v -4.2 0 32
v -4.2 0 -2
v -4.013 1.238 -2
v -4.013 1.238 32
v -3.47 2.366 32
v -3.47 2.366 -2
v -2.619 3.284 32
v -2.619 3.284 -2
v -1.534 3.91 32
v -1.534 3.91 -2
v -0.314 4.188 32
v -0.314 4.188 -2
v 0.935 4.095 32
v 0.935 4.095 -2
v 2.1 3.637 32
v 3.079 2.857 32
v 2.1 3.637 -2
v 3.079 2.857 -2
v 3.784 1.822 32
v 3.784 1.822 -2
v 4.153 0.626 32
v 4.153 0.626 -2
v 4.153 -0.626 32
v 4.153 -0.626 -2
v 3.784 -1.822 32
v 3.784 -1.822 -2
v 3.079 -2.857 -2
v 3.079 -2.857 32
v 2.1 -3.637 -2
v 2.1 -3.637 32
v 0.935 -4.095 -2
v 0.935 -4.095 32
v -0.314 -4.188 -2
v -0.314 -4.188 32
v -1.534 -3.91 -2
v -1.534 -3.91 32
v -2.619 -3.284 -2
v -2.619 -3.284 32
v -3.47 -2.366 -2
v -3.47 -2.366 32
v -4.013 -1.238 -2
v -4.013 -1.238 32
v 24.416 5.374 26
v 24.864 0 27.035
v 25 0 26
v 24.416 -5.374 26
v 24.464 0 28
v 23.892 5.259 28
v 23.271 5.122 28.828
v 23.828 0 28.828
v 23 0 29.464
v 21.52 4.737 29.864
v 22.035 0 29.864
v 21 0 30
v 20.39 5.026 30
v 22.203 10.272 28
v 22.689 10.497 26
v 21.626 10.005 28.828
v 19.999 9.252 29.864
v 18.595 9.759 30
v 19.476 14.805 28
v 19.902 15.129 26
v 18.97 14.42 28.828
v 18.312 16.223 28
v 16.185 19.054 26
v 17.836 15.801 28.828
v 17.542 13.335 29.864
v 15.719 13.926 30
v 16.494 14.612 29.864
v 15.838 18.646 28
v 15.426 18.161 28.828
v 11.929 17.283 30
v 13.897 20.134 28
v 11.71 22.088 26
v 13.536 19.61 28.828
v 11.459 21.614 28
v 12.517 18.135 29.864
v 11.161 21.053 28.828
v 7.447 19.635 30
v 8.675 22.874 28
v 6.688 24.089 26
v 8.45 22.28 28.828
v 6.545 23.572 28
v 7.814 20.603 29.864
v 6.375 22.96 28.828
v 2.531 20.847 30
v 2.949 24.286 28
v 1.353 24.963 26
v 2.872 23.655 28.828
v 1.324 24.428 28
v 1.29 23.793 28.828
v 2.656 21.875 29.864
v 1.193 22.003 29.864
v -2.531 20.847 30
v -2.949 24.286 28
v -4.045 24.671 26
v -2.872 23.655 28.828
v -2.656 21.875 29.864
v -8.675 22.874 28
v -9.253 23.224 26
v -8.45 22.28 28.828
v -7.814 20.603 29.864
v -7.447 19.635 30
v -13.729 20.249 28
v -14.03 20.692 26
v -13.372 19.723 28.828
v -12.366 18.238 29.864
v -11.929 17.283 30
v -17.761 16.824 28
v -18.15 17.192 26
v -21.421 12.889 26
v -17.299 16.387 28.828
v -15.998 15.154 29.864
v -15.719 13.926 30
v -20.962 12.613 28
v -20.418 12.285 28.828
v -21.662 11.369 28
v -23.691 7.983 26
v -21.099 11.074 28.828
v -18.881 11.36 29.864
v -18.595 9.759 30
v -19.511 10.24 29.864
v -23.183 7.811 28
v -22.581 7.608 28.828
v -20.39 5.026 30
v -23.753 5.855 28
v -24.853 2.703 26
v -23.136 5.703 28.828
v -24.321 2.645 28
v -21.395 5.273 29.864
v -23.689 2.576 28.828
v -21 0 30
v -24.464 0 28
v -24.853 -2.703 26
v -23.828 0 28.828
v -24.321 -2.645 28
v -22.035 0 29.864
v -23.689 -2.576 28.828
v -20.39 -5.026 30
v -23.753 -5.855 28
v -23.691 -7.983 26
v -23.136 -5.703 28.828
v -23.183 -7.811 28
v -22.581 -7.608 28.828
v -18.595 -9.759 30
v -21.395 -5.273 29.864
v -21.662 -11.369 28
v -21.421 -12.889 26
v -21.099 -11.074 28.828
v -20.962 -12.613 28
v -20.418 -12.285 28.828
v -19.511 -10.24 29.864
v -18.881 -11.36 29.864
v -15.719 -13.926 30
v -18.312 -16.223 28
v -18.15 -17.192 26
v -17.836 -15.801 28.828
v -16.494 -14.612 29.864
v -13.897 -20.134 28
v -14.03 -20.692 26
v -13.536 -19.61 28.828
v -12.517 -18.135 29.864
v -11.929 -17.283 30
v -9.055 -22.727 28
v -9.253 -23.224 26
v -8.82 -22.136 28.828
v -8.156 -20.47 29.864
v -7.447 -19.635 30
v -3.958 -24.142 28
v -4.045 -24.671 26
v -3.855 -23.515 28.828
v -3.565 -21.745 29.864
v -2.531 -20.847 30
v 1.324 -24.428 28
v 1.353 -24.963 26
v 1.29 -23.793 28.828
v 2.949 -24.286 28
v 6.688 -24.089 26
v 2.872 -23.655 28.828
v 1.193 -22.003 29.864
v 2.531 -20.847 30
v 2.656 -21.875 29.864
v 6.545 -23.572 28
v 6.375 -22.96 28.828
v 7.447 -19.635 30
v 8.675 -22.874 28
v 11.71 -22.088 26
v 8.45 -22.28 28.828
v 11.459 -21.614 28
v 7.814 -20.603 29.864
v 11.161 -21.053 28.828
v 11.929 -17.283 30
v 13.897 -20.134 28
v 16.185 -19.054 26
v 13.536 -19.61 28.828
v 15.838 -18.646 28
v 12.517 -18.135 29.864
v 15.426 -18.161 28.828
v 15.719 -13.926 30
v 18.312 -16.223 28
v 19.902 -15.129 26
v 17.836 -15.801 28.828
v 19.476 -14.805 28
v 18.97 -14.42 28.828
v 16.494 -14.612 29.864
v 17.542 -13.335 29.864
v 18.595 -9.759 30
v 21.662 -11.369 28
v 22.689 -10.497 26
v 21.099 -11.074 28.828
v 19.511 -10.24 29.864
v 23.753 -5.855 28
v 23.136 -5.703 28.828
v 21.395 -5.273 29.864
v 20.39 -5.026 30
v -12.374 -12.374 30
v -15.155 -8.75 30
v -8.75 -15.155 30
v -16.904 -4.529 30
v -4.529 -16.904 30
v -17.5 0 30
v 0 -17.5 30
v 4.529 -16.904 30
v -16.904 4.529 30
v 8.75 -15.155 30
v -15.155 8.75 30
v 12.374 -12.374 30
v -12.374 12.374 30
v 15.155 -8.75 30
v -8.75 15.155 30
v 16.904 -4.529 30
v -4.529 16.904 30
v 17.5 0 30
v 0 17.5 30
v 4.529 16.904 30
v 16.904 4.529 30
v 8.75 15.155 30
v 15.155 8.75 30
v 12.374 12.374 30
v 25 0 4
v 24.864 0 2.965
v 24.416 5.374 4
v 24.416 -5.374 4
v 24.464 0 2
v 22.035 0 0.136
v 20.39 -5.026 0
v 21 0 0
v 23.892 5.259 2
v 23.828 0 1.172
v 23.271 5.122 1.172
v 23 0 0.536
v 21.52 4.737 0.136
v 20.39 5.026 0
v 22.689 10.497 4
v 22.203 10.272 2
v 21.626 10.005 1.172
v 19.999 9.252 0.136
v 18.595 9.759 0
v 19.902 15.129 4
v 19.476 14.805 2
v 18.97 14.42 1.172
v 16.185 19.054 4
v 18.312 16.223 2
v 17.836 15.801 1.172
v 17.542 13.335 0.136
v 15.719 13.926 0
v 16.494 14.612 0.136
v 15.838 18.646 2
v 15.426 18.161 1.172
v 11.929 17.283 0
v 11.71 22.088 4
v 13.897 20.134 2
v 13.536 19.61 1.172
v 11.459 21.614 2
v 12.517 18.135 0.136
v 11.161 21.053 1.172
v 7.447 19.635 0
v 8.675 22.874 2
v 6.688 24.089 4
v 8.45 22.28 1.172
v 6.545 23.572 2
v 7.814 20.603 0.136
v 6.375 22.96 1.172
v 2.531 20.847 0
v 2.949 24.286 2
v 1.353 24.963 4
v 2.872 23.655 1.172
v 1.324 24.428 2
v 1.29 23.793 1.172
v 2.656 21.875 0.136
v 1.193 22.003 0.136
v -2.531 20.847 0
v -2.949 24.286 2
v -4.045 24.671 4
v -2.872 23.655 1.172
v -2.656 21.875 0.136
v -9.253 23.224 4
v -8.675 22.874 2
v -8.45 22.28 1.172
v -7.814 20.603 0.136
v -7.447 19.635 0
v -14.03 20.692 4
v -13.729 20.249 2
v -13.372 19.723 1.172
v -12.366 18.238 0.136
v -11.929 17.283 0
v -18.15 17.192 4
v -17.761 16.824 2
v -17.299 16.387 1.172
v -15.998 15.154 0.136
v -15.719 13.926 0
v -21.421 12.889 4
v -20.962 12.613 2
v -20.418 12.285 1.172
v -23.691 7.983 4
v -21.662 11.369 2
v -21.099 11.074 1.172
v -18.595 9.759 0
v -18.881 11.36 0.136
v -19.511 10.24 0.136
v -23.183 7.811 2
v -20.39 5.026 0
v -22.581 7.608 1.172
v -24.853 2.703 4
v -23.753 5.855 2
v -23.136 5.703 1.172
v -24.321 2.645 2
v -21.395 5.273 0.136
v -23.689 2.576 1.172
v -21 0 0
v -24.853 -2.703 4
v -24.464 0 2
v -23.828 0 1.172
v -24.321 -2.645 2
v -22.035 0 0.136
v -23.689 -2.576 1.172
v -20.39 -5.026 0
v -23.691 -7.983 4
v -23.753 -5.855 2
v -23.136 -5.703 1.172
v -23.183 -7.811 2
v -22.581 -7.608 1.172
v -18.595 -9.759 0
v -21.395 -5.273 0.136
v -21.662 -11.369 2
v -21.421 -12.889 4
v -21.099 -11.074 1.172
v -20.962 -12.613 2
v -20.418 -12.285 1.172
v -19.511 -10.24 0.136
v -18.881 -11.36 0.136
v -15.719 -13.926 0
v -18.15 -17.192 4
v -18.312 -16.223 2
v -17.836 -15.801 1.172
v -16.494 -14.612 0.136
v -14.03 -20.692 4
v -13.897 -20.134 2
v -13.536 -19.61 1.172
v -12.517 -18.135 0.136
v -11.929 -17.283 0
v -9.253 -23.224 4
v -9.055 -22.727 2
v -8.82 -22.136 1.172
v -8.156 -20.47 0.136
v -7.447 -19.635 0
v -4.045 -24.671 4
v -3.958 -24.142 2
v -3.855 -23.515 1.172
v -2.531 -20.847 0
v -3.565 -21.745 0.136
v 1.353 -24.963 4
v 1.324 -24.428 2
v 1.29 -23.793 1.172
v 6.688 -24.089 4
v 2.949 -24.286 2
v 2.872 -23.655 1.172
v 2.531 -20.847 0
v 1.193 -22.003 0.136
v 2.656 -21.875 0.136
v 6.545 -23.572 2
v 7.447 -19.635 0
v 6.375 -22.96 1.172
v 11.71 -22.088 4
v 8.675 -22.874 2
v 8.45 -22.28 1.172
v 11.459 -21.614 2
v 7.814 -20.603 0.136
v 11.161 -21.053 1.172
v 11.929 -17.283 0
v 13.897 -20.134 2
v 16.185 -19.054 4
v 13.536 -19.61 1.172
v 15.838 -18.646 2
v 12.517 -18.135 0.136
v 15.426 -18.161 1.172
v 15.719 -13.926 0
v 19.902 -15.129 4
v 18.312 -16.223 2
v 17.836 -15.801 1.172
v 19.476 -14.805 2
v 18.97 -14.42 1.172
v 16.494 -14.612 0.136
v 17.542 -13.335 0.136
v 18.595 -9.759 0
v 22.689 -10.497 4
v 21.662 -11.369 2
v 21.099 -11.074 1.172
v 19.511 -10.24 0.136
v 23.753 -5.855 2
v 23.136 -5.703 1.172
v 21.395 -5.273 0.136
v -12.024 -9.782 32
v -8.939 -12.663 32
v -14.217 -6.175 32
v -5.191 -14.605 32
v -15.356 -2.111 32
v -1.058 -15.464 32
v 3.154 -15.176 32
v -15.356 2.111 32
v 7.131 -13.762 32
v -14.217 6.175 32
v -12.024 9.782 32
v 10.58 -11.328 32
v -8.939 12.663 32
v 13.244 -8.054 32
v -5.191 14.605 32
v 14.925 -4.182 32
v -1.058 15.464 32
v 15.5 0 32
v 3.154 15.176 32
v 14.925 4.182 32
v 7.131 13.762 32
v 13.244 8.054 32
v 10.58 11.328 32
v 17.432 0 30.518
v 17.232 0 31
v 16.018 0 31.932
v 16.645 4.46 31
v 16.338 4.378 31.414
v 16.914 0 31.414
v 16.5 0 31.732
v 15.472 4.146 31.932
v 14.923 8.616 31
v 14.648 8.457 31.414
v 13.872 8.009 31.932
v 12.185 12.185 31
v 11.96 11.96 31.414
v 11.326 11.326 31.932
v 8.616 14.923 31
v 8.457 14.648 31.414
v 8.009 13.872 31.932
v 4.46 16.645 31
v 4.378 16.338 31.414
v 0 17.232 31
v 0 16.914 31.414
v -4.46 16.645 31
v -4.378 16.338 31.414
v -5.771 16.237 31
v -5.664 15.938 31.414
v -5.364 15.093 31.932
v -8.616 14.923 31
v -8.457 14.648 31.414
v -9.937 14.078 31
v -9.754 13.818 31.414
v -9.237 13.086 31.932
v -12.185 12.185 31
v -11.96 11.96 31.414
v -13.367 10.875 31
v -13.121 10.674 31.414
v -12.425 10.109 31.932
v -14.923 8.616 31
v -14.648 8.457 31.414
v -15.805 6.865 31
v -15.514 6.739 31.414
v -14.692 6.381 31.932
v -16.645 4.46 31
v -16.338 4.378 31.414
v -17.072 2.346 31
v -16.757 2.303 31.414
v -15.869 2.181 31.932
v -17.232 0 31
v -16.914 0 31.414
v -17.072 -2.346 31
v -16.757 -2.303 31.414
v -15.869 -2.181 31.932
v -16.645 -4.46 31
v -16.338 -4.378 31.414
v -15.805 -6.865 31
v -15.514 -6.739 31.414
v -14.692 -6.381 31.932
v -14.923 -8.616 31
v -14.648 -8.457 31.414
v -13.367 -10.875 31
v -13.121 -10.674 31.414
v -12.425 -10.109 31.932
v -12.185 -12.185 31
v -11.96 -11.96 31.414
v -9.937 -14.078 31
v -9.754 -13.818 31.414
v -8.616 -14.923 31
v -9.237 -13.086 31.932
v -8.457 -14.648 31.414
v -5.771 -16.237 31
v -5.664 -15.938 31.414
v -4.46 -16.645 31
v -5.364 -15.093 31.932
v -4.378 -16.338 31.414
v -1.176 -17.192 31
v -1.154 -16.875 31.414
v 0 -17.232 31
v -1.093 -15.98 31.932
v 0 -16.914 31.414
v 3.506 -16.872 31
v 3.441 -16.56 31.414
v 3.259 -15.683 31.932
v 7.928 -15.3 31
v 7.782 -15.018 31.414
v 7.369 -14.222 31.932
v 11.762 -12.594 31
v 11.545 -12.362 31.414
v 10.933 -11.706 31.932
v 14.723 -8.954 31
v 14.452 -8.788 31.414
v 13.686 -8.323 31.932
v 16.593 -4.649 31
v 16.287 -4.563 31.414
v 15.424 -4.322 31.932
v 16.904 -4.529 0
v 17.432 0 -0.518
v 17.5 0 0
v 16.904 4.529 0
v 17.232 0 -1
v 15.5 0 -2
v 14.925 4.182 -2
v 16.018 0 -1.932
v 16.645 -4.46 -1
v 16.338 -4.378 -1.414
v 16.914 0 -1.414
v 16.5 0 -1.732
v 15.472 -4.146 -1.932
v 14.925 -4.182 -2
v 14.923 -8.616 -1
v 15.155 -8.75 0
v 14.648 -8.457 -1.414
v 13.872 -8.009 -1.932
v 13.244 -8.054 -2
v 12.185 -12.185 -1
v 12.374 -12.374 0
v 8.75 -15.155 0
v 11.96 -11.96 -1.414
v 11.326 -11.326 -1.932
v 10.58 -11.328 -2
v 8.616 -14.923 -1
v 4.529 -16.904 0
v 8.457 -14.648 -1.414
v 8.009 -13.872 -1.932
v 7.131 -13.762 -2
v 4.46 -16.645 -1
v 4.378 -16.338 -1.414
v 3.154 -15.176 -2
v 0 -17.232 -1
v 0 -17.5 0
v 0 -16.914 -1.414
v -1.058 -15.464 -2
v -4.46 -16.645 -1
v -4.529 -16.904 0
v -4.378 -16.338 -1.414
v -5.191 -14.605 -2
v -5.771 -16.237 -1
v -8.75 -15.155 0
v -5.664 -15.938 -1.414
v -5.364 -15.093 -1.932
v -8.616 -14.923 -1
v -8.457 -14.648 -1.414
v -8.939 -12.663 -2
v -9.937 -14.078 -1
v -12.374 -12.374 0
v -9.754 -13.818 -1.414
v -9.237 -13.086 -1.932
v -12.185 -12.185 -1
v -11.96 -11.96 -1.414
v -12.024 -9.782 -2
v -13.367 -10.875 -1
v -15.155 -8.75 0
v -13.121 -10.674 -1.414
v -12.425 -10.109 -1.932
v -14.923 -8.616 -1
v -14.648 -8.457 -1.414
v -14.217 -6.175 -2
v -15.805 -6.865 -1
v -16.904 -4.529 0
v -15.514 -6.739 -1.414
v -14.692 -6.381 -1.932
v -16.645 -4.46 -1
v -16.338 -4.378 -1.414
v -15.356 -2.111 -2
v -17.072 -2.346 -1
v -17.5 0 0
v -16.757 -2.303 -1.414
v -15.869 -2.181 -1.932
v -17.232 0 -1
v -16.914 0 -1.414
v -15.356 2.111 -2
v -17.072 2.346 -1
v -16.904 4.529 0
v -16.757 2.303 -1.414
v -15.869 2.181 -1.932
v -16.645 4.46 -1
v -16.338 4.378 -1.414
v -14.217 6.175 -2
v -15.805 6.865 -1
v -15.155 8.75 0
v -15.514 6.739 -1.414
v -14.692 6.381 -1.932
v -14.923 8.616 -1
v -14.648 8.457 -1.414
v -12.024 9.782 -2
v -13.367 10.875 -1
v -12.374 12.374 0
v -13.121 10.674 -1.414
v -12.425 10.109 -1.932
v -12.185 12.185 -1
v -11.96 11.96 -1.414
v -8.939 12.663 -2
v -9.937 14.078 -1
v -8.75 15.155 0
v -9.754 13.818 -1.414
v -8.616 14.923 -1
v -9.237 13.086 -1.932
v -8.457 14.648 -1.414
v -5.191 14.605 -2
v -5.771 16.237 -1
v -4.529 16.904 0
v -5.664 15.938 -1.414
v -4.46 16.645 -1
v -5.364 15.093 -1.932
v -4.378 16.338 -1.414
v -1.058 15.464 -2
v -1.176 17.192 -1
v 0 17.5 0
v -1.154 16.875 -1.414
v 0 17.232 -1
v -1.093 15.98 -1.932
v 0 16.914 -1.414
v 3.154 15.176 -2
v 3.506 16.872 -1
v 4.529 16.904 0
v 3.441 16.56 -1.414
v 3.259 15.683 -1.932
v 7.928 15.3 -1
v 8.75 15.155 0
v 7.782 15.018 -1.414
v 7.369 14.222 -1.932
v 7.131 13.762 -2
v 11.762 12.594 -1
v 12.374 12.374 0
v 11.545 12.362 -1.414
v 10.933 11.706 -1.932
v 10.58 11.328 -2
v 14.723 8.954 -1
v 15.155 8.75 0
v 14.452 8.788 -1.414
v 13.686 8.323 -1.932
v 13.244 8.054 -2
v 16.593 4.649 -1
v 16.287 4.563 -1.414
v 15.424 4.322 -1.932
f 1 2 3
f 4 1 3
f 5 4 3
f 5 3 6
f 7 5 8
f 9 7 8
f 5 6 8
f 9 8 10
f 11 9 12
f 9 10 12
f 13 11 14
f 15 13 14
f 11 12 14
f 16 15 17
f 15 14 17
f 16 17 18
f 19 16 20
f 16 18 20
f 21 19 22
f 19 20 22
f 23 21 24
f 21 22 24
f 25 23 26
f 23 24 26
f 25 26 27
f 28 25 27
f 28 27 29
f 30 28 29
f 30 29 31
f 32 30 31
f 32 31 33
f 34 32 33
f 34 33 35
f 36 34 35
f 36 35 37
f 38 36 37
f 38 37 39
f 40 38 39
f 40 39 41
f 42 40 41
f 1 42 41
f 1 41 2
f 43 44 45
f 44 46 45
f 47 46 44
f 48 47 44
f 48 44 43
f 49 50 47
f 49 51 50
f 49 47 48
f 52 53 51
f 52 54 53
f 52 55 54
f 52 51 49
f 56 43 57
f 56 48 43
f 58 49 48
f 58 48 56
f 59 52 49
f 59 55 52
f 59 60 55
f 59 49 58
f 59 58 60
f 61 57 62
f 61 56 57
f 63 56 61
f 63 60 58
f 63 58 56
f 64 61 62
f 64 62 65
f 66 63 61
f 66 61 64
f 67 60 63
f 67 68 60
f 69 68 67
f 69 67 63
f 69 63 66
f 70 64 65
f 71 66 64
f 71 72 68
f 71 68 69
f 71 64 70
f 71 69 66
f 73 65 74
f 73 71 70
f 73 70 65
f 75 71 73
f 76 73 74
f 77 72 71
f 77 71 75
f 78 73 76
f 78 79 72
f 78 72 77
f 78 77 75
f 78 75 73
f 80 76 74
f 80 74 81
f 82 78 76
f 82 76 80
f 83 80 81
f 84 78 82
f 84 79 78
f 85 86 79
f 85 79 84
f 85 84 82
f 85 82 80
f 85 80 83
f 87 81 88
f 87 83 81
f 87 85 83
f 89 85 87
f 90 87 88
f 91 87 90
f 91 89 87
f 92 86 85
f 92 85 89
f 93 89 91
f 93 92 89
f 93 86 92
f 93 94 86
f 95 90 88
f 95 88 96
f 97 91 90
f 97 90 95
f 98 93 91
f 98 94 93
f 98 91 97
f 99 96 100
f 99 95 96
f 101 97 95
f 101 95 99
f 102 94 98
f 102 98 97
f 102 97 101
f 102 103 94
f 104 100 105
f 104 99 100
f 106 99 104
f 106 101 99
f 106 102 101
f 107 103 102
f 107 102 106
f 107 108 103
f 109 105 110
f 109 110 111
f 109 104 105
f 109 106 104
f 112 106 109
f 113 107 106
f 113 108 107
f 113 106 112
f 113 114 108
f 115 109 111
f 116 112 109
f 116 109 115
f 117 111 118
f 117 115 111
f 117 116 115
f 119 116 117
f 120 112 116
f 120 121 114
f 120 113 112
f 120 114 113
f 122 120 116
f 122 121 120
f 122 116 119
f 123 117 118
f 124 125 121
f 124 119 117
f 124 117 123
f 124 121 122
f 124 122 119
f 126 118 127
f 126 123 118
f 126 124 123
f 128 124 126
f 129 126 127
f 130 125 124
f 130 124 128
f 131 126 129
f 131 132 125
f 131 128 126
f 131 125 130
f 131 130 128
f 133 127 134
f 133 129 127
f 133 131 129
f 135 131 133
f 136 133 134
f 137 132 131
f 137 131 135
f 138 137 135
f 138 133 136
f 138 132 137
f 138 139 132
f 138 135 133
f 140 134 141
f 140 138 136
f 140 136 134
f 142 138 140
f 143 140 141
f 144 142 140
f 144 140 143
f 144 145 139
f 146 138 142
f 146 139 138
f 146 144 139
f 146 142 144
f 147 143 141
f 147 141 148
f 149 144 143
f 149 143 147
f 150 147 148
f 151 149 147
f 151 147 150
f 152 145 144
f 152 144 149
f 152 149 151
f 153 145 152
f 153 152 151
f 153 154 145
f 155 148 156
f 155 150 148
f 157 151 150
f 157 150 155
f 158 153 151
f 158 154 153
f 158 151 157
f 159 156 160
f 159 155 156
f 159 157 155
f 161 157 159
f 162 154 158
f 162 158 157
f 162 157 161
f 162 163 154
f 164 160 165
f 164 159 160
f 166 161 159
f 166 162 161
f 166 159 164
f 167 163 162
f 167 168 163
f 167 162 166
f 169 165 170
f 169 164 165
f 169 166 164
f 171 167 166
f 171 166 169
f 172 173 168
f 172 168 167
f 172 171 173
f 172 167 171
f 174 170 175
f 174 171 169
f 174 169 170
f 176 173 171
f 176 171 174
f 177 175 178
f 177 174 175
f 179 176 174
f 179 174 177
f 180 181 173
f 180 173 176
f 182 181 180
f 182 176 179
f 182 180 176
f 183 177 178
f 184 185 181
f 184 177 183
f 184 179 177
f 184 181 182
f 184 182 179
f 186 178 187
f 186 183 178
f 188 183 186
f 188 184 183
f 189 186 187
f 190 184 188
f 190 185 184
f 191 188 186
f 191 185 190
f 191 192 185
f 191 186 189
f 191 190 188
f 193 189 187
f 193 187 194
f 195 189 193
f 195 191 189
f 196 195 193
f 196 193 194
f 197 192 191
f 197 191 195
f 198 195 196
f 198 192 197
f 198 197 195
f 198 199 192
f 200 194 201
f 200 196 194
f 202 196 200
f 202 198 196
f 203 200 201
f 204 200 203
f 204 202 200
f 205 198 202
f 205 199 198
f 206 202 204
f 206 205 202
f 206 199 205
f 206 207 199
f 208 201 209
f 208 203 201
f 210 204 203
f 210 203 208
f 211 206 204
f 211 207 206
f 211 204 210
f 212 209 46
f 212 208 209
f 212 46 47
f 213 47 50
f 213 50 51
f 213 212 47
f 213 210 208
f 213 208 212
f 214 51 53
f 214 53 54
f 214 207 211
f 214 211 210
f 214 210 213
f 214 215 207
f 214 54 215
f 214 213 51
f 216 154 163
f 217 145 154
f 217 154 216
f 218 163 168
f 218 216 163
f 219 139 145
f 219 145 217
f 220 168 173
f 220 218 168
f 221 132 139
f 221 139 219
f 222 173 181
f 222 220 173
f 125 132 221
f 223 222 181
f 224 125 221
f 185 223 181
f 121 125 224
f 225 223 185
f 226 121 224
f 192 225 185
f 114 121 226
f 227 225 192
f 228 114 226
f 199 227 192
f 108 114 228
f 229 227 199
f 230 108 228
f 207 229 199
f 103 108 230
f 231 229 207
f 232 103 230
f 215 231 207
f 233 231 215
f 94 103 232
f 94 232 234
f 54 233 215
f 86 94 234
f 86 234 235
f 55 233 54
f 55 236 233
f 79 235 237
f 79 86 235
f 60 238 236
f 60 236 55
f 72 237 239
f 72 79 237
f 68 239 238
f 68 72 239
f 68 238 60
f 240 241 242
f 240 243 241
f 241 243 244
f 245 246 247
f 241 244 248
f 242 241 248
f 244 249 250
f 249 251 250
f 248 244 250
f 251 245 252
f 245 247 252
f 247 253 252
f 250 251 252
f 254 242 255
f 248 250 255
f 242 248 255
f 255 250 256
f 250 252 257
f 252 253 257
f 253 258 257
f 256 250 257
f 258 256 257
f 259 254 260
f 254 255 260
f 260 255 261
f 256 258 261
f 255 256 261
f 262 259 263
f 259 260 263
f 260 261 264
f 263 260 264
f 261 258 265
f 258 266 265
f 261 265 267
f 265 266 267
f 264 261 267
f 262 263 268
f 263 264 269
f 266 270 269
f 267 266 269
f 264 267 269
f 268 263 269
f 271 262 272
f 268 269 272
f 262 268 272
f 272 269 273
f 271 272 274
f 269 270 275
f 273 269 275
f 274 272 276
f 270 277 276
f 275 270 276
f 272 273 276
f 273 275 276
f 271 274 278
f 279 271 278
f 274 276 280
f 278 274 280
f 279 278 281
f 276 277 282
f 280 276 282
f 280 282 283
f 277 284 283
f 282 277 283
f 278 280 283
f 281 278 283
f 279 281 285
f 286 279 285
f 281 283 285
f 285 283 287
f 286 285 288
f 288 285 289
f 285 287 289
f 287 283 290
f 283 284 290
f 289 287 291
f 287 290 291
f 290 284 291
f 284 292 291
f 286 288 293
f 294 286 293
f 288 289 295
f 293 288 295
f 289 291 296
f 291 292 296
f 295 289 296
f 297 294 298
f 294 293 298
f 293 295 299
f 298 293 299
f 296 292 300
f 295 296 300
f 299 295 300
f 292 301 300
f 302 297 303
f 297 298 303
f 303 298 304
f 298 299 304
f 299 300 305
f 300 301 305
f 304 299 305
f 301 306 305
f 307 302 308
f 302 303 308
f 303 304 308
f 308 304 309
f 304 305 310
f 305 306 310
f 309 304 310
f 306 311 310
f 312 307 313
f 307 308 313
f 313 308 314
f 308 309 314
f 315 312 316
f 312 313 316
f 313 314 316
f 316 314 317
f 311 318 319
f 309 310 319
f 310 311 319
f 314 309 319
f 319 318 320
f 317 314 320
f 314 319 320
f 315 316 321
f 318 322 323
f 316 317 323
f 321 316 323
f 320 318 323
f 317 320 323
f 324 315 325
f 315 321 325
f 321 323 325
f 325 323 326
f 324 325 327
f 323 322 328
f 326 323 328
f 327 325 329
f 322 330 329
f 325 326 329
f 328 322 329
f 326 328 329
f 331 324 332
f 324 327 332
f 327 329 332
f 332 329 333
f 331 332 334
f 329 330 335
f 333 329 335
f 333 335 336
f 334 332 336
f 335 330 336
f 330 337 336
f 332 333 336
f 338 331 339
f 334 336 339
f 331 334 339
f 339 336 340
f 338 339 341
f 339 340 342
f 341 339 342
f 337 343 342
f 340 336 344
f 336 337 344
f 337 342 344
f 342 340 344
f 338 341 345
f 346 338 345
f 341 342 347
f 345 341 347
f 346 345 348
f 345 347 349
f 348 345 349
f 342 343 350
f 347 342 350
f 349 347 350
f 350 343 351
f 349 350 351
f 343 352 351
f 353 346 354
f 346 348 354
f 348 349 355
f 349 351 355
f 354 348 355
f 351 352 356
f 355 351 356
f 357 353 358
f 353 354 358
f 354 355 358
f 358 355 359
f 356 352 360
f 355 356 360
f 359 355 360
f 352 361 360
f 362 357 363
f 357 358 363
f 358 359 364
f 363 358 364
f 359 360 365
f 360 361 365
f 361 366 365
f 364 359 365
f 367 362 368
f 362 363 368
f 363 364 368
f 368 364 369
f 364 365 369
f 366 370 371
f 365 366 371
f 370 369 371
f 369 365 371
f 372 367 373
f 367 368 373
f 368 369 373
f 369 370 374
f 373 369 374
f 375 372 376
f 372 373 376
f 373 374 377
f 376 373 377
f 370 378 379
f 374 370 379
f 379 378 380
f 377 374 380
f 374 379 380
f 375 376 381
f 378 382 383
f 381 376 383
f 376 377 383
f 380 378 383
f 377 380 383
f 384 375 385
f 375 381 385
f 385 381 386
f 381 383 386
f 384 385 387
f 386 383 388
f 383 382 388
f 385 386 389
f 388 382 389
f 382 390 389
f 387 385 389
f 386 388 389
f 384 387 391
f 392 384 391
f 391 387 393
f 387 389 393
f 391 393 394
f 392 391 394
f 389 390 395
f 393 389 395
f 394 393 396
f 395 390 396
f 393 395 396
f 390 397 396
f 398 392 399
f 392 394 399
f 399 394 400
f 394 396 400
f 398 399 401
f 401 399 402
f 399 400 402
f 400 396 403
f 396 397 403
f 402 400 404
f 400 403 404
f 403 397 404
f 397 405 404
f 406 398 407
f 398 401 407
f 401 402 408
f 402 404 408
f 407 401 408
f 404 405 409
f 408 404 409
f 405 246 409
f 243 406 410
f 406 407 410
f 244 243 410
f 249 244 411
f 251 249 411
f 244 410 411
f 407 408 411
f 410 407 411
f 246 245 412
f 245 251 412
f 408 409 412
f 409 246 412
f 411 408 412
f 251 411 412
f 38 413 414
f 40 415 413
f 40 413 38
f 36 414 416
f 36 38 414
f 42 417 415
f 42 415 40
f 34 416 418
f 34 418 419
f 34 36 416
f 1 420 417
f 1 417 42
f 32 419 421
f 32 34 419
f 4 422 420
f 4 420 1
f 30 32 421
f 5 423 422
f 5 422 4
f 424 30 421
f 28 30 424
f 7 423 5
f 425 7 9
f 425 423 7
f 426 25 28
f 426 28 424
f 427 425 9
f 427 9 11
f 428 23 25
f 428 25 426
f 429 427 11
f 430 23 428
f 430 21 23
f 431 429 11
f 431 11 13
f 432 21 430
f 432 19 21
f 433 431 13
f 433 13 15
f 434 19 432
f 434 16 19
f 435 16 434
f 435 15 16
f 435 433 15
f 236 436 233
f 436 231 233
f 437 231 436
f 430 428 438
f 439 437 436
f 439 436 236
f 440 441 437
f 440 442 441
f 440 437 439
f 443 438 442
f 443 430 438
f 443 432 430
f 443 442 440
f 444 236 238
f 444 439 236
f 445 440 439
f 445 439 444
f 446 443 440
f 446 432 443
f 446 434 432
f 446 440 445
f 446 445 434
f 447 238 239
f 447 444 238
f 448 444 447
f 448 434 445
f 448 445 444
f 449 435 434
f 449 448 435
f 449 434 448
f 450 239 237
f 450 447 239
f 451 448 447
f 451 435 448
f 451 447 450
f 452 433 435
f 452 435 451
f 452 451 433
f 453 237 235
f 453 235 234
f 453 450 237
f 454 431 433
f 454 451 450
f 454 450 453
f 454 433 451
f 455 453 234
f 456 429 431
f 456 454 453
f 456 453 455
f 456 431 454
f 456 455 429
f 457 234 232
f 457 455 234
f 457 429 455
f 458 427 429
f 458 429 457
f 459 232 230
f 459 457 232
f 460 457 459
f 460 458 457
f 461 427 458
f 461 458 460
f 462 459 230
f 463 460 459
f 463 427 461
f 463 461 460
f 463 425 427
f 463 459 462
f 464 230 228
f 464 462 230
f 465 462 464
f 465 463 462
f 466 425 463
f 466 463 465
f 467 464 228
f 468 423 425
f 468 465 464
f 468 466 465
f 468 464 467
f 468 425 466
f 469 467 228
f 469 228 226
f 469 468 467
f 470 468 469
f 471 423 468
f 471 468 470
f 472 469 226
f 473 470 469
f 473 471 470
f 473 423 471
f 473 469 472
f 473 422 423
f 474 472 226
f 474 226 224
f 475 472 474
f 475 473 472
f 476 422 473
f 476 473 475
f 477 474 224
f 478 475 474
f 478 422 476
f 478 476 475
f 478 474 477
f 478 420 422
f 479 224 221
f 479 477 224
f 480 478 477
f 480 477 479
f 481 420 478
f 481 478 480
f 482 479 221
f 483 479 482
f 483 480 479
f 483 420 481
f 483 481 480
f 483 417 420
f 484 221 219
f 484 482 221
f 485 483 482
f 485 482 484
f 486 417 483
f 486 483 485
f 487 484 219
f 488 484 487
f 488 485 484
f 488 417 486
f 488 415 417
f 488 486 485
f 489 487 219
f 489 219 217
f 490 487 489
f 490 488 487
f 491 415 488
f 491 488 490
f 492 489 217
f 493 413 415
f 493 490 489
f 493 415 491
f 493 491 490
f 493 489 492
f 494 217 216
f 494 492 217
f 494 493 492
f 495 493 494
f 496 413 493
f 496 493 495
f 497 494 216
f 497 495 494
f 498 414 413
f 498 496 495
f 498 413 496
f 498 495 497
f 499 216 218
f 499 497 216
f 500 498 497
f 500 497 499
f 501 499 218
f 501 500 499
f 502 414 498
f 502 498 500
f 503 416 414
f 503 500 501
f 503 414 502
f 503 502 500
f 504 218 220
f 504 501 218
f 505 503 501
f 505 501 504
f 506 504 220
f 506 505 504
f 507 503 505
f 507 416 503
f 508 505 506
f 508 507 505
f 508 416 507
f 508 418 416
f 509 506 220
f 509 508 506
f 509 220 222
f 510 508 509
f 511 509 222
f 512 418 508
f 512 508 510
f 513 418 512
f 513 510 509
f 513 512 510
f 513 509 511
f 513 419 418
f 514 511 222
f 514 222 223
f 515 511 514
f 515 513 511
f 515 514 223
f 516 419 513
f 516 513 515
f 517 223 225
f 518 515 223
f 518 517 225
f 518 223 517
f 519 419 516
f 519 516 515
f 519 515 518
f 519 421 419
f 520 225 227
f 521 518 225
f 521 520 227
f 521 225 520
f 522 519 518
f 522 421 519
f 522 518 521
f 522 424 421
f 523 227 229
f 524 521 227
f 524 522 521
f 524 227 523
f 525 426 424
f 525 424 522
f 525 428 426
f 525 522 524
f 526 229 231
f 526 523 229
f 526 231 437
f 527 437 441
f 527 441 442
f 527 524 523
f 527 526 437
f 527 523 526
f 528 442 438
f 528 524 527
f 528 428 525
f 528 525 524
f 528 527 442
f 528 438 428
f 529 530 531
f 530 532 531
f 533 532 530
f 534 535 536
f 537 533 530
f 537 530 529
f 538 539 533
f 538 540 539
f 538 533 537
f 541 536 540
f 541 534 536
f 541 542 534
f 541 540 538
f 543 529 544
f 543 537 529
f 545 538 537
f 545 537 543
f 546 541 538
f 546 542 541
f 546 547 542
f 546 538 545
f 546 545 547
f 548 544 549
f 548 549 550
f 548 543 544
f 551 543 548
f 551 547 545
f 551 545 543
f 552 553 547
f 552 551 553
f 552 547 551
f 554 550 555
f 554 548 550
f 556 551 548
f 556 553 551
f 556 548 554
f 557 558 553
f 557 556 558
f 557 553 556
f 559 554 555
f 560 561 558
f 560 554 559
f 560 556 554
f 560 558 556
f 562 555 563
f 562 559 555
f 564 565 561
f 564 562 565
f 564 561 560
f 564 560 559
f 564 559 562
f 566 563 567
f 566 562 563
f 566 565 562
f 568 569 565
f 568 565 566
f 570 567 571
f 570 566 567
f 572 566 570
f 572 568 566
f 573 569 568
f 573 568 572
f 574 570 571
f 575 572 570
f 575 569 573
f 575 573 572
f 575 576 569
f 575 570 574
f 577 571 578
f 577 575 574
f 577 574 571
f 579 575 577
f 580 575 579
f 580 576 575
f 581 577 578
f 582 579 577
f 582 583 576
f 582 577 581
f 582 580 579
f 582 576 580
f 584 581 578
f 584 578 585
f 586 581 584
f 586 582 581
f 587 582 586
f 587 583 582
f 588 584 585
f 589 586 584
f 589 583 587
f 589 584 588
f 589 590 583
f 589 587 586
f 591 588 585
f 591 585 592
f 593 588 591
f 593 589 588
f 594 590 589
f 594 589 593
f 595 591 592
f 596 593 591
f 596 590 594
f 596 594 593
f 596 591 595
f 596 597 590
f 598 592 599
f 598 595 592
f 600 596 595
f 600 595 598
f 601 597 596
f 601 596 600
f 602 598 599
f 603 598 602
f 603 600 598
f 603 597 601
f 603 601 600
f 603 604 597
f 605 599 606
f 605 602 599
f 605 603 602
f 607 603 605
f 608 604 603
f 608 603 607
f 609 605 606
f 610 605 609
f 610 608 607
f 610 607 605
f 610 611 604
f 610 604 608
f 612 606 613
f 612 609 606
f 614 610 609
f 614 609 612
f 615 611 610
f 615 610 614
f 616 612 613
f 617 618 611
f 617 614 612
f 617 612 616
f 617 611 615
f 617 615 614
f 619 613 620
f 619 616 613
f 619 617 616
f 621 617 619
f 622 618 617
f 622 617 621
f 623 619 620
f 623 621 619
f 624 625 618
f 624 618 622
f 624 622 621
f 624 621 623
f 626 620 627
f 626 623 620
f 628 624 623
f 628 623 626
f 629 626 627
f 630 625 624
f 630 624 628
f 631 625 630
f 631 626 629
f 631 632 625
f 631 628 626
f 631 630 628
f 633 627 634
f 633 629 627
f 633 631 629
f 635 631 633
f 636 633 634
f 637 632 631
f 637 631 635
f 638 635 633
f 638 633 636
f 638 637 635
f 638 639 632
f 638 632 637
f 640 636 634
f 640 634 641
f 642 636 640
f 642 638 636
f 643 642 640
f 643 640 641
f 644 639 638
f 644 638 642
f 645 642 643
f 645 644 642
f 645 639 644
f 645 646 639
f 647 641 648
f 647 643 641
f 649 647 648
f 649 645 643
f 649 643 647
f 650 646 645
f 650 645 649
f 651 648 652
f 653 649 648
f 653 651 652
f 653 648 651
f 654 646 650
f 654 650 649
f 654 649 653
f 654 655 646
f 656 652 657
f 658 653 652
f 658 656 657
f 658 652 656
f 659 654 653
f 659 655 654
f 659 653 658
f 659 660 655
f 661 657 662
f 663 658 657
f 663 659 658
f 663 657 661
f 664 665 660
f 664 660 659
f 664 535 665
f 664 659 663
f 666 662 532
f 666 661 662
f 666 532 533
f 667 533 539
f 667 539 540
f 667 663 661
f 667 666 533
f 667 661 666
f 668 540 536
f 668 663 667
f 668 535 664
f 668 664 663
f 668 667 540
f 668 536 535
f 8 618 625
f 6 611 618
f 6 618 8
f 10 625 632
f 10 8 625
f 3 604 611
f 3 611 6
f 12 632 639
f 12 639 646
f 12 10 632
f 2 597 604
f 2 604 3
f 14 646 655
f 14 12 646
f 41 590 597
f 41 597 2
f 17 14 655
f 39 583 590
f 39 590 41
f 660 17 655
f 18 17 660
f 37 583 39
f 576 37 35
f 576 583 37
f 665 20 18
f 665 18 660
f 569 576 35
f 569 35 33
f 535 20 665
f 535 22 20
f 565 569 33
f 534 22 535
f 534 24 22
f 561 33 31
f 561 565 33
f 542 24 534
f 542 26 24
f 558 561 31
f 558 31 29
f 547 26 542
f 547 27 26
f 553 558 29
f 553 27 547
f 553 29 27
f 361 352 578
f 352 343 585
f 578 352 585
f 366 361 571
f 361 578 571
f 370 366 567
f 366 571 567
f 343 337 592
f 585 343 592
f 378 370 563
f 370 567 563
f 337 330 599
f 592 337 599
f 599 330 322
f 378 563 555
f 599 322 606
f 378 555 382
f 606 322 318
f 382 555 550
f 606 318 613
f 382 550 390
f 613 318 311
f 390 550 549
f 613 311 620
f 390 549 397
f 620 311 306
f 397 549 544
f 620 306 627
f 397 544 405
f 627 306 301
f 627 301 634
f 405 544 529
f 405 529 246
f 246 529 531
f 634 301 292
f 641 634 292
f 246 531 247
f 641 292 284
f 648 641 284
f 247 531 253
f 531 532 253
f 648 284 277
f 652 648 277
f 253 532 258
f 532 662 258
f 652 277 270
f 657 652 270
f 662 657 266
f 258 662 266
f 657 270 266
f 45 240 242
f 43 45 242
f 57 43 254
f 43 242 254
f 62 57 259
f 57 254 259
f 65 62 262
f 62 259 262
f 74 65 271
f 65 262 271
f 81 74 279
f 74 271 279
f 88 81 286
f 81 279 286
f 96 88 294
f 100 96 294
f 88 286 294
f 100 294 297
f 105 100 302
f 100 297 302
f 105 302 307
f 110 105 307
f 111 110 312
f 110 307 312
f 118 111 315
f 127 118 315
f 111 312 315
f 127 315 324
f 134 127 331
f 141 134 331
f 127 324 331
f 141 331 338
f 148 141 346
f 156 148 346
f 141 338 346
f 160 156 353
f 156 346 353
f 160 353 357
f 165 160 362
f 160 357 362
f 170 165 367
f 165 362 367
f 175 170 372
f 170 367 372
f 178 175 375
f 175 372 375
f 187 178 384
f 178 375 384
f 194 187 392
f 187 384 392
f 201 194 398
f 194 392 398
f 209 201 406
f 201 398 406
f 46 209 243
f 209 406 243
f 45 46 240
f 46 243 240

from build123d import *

# Parameters (mm, degrees)
SKETCH_1_R          = 25
EXTRUDE_1_DEPTH     = 30
FILLET_1_R          = 4
FILLET_2_R          = 4
SKETCH_2_R          = 17.5
EXTRUDE_2_DEPTH     = 2
FILLET_3_R          = 2
EXTRUDE_START       = 2
SKETCH_3_R          = 17.5
EXTRUDE_3_DEPTH     = 2
FILLET_4_R          = 2
SKETCH_4_R          = 4.2
CUT_EXTRUDE_1_DEPTH = 50.050993874


with BuildPart() as part:
    # 草图1 → 凸台-拉伸1 (new body)
    with BuildSketch(Plane.XY):
        Circle(SKETCH_1_R)
    extrude(amount=EXTRUDE_1_DEPTH)

    # 圆角1
    fillet_1_edges = [part.edges().sort_by_distance(p)[0] for p in [
        (-25, 0, 30),
    ]]
    fillet(fillet_1_edges, radius=FILLET_1_R)

    # 圆角2
    fillet_2_edges = [part.edges().sort_by_distance(p)[0] for p in [
        (-25, 0, 0),
    ]]
    fillet(fillet_2_edges, radius=FILLET_2_R)

    # 草图2 → 凸台-拉伸2 (add)
    with BuildSketch(Plane.XY.offset(30)):
        Circle(SKETCH_2_R)
    extrude(amount=EXTRUDE_2_DEPTH)

    # 圆角3
    fillet_3_edges = [part.edges().sort_by_distance(p)[0] for p in [
        (-17.5, 0, 32),
    ]]
    fillet(fillet_3_edges, radius=FILLET_3_R - 0.0001)  # a hair under: the kernel refuses the full size

    # 草图3 → 凸台-拉伸3 (add)
    with BuildSketch(Plane(origin=(0, 0, 0), x_dir=(-1, 0, 0), z_dir=(0, 0, -1)).offset(EXTRUDE_START)):
        with Locations(Location((0, 0, 0), (0, 0, 180))):
            Circle(SKETCH_3_R)
    extrude(amount=-EXTRUDE_3_DEPTH)

    # 圆角4
    fillet_4_edges = [part.edges().sort_by_distance(p)[0] for p in [
        (-17.5, 0, -2),
    ]]
    fillet(fillet_4_edges, radius=FILLET_4_R - 0.0001)  # a hair under: the kernel refuses the full size

    # 草图4 → 切除-拉伸1 (cut, through all)
    with BuildSketch(Plane(origin=(0, 0, -2), x_dir=(-1, 0, 0), z_dir=(0, 0, -1))):
        Circle(SKETCH_4_R)
    extrude(amount=-CUT_EXTRUDE_1_DEPTH, mode=Mode.SUBTRACT)


solid = part.part
